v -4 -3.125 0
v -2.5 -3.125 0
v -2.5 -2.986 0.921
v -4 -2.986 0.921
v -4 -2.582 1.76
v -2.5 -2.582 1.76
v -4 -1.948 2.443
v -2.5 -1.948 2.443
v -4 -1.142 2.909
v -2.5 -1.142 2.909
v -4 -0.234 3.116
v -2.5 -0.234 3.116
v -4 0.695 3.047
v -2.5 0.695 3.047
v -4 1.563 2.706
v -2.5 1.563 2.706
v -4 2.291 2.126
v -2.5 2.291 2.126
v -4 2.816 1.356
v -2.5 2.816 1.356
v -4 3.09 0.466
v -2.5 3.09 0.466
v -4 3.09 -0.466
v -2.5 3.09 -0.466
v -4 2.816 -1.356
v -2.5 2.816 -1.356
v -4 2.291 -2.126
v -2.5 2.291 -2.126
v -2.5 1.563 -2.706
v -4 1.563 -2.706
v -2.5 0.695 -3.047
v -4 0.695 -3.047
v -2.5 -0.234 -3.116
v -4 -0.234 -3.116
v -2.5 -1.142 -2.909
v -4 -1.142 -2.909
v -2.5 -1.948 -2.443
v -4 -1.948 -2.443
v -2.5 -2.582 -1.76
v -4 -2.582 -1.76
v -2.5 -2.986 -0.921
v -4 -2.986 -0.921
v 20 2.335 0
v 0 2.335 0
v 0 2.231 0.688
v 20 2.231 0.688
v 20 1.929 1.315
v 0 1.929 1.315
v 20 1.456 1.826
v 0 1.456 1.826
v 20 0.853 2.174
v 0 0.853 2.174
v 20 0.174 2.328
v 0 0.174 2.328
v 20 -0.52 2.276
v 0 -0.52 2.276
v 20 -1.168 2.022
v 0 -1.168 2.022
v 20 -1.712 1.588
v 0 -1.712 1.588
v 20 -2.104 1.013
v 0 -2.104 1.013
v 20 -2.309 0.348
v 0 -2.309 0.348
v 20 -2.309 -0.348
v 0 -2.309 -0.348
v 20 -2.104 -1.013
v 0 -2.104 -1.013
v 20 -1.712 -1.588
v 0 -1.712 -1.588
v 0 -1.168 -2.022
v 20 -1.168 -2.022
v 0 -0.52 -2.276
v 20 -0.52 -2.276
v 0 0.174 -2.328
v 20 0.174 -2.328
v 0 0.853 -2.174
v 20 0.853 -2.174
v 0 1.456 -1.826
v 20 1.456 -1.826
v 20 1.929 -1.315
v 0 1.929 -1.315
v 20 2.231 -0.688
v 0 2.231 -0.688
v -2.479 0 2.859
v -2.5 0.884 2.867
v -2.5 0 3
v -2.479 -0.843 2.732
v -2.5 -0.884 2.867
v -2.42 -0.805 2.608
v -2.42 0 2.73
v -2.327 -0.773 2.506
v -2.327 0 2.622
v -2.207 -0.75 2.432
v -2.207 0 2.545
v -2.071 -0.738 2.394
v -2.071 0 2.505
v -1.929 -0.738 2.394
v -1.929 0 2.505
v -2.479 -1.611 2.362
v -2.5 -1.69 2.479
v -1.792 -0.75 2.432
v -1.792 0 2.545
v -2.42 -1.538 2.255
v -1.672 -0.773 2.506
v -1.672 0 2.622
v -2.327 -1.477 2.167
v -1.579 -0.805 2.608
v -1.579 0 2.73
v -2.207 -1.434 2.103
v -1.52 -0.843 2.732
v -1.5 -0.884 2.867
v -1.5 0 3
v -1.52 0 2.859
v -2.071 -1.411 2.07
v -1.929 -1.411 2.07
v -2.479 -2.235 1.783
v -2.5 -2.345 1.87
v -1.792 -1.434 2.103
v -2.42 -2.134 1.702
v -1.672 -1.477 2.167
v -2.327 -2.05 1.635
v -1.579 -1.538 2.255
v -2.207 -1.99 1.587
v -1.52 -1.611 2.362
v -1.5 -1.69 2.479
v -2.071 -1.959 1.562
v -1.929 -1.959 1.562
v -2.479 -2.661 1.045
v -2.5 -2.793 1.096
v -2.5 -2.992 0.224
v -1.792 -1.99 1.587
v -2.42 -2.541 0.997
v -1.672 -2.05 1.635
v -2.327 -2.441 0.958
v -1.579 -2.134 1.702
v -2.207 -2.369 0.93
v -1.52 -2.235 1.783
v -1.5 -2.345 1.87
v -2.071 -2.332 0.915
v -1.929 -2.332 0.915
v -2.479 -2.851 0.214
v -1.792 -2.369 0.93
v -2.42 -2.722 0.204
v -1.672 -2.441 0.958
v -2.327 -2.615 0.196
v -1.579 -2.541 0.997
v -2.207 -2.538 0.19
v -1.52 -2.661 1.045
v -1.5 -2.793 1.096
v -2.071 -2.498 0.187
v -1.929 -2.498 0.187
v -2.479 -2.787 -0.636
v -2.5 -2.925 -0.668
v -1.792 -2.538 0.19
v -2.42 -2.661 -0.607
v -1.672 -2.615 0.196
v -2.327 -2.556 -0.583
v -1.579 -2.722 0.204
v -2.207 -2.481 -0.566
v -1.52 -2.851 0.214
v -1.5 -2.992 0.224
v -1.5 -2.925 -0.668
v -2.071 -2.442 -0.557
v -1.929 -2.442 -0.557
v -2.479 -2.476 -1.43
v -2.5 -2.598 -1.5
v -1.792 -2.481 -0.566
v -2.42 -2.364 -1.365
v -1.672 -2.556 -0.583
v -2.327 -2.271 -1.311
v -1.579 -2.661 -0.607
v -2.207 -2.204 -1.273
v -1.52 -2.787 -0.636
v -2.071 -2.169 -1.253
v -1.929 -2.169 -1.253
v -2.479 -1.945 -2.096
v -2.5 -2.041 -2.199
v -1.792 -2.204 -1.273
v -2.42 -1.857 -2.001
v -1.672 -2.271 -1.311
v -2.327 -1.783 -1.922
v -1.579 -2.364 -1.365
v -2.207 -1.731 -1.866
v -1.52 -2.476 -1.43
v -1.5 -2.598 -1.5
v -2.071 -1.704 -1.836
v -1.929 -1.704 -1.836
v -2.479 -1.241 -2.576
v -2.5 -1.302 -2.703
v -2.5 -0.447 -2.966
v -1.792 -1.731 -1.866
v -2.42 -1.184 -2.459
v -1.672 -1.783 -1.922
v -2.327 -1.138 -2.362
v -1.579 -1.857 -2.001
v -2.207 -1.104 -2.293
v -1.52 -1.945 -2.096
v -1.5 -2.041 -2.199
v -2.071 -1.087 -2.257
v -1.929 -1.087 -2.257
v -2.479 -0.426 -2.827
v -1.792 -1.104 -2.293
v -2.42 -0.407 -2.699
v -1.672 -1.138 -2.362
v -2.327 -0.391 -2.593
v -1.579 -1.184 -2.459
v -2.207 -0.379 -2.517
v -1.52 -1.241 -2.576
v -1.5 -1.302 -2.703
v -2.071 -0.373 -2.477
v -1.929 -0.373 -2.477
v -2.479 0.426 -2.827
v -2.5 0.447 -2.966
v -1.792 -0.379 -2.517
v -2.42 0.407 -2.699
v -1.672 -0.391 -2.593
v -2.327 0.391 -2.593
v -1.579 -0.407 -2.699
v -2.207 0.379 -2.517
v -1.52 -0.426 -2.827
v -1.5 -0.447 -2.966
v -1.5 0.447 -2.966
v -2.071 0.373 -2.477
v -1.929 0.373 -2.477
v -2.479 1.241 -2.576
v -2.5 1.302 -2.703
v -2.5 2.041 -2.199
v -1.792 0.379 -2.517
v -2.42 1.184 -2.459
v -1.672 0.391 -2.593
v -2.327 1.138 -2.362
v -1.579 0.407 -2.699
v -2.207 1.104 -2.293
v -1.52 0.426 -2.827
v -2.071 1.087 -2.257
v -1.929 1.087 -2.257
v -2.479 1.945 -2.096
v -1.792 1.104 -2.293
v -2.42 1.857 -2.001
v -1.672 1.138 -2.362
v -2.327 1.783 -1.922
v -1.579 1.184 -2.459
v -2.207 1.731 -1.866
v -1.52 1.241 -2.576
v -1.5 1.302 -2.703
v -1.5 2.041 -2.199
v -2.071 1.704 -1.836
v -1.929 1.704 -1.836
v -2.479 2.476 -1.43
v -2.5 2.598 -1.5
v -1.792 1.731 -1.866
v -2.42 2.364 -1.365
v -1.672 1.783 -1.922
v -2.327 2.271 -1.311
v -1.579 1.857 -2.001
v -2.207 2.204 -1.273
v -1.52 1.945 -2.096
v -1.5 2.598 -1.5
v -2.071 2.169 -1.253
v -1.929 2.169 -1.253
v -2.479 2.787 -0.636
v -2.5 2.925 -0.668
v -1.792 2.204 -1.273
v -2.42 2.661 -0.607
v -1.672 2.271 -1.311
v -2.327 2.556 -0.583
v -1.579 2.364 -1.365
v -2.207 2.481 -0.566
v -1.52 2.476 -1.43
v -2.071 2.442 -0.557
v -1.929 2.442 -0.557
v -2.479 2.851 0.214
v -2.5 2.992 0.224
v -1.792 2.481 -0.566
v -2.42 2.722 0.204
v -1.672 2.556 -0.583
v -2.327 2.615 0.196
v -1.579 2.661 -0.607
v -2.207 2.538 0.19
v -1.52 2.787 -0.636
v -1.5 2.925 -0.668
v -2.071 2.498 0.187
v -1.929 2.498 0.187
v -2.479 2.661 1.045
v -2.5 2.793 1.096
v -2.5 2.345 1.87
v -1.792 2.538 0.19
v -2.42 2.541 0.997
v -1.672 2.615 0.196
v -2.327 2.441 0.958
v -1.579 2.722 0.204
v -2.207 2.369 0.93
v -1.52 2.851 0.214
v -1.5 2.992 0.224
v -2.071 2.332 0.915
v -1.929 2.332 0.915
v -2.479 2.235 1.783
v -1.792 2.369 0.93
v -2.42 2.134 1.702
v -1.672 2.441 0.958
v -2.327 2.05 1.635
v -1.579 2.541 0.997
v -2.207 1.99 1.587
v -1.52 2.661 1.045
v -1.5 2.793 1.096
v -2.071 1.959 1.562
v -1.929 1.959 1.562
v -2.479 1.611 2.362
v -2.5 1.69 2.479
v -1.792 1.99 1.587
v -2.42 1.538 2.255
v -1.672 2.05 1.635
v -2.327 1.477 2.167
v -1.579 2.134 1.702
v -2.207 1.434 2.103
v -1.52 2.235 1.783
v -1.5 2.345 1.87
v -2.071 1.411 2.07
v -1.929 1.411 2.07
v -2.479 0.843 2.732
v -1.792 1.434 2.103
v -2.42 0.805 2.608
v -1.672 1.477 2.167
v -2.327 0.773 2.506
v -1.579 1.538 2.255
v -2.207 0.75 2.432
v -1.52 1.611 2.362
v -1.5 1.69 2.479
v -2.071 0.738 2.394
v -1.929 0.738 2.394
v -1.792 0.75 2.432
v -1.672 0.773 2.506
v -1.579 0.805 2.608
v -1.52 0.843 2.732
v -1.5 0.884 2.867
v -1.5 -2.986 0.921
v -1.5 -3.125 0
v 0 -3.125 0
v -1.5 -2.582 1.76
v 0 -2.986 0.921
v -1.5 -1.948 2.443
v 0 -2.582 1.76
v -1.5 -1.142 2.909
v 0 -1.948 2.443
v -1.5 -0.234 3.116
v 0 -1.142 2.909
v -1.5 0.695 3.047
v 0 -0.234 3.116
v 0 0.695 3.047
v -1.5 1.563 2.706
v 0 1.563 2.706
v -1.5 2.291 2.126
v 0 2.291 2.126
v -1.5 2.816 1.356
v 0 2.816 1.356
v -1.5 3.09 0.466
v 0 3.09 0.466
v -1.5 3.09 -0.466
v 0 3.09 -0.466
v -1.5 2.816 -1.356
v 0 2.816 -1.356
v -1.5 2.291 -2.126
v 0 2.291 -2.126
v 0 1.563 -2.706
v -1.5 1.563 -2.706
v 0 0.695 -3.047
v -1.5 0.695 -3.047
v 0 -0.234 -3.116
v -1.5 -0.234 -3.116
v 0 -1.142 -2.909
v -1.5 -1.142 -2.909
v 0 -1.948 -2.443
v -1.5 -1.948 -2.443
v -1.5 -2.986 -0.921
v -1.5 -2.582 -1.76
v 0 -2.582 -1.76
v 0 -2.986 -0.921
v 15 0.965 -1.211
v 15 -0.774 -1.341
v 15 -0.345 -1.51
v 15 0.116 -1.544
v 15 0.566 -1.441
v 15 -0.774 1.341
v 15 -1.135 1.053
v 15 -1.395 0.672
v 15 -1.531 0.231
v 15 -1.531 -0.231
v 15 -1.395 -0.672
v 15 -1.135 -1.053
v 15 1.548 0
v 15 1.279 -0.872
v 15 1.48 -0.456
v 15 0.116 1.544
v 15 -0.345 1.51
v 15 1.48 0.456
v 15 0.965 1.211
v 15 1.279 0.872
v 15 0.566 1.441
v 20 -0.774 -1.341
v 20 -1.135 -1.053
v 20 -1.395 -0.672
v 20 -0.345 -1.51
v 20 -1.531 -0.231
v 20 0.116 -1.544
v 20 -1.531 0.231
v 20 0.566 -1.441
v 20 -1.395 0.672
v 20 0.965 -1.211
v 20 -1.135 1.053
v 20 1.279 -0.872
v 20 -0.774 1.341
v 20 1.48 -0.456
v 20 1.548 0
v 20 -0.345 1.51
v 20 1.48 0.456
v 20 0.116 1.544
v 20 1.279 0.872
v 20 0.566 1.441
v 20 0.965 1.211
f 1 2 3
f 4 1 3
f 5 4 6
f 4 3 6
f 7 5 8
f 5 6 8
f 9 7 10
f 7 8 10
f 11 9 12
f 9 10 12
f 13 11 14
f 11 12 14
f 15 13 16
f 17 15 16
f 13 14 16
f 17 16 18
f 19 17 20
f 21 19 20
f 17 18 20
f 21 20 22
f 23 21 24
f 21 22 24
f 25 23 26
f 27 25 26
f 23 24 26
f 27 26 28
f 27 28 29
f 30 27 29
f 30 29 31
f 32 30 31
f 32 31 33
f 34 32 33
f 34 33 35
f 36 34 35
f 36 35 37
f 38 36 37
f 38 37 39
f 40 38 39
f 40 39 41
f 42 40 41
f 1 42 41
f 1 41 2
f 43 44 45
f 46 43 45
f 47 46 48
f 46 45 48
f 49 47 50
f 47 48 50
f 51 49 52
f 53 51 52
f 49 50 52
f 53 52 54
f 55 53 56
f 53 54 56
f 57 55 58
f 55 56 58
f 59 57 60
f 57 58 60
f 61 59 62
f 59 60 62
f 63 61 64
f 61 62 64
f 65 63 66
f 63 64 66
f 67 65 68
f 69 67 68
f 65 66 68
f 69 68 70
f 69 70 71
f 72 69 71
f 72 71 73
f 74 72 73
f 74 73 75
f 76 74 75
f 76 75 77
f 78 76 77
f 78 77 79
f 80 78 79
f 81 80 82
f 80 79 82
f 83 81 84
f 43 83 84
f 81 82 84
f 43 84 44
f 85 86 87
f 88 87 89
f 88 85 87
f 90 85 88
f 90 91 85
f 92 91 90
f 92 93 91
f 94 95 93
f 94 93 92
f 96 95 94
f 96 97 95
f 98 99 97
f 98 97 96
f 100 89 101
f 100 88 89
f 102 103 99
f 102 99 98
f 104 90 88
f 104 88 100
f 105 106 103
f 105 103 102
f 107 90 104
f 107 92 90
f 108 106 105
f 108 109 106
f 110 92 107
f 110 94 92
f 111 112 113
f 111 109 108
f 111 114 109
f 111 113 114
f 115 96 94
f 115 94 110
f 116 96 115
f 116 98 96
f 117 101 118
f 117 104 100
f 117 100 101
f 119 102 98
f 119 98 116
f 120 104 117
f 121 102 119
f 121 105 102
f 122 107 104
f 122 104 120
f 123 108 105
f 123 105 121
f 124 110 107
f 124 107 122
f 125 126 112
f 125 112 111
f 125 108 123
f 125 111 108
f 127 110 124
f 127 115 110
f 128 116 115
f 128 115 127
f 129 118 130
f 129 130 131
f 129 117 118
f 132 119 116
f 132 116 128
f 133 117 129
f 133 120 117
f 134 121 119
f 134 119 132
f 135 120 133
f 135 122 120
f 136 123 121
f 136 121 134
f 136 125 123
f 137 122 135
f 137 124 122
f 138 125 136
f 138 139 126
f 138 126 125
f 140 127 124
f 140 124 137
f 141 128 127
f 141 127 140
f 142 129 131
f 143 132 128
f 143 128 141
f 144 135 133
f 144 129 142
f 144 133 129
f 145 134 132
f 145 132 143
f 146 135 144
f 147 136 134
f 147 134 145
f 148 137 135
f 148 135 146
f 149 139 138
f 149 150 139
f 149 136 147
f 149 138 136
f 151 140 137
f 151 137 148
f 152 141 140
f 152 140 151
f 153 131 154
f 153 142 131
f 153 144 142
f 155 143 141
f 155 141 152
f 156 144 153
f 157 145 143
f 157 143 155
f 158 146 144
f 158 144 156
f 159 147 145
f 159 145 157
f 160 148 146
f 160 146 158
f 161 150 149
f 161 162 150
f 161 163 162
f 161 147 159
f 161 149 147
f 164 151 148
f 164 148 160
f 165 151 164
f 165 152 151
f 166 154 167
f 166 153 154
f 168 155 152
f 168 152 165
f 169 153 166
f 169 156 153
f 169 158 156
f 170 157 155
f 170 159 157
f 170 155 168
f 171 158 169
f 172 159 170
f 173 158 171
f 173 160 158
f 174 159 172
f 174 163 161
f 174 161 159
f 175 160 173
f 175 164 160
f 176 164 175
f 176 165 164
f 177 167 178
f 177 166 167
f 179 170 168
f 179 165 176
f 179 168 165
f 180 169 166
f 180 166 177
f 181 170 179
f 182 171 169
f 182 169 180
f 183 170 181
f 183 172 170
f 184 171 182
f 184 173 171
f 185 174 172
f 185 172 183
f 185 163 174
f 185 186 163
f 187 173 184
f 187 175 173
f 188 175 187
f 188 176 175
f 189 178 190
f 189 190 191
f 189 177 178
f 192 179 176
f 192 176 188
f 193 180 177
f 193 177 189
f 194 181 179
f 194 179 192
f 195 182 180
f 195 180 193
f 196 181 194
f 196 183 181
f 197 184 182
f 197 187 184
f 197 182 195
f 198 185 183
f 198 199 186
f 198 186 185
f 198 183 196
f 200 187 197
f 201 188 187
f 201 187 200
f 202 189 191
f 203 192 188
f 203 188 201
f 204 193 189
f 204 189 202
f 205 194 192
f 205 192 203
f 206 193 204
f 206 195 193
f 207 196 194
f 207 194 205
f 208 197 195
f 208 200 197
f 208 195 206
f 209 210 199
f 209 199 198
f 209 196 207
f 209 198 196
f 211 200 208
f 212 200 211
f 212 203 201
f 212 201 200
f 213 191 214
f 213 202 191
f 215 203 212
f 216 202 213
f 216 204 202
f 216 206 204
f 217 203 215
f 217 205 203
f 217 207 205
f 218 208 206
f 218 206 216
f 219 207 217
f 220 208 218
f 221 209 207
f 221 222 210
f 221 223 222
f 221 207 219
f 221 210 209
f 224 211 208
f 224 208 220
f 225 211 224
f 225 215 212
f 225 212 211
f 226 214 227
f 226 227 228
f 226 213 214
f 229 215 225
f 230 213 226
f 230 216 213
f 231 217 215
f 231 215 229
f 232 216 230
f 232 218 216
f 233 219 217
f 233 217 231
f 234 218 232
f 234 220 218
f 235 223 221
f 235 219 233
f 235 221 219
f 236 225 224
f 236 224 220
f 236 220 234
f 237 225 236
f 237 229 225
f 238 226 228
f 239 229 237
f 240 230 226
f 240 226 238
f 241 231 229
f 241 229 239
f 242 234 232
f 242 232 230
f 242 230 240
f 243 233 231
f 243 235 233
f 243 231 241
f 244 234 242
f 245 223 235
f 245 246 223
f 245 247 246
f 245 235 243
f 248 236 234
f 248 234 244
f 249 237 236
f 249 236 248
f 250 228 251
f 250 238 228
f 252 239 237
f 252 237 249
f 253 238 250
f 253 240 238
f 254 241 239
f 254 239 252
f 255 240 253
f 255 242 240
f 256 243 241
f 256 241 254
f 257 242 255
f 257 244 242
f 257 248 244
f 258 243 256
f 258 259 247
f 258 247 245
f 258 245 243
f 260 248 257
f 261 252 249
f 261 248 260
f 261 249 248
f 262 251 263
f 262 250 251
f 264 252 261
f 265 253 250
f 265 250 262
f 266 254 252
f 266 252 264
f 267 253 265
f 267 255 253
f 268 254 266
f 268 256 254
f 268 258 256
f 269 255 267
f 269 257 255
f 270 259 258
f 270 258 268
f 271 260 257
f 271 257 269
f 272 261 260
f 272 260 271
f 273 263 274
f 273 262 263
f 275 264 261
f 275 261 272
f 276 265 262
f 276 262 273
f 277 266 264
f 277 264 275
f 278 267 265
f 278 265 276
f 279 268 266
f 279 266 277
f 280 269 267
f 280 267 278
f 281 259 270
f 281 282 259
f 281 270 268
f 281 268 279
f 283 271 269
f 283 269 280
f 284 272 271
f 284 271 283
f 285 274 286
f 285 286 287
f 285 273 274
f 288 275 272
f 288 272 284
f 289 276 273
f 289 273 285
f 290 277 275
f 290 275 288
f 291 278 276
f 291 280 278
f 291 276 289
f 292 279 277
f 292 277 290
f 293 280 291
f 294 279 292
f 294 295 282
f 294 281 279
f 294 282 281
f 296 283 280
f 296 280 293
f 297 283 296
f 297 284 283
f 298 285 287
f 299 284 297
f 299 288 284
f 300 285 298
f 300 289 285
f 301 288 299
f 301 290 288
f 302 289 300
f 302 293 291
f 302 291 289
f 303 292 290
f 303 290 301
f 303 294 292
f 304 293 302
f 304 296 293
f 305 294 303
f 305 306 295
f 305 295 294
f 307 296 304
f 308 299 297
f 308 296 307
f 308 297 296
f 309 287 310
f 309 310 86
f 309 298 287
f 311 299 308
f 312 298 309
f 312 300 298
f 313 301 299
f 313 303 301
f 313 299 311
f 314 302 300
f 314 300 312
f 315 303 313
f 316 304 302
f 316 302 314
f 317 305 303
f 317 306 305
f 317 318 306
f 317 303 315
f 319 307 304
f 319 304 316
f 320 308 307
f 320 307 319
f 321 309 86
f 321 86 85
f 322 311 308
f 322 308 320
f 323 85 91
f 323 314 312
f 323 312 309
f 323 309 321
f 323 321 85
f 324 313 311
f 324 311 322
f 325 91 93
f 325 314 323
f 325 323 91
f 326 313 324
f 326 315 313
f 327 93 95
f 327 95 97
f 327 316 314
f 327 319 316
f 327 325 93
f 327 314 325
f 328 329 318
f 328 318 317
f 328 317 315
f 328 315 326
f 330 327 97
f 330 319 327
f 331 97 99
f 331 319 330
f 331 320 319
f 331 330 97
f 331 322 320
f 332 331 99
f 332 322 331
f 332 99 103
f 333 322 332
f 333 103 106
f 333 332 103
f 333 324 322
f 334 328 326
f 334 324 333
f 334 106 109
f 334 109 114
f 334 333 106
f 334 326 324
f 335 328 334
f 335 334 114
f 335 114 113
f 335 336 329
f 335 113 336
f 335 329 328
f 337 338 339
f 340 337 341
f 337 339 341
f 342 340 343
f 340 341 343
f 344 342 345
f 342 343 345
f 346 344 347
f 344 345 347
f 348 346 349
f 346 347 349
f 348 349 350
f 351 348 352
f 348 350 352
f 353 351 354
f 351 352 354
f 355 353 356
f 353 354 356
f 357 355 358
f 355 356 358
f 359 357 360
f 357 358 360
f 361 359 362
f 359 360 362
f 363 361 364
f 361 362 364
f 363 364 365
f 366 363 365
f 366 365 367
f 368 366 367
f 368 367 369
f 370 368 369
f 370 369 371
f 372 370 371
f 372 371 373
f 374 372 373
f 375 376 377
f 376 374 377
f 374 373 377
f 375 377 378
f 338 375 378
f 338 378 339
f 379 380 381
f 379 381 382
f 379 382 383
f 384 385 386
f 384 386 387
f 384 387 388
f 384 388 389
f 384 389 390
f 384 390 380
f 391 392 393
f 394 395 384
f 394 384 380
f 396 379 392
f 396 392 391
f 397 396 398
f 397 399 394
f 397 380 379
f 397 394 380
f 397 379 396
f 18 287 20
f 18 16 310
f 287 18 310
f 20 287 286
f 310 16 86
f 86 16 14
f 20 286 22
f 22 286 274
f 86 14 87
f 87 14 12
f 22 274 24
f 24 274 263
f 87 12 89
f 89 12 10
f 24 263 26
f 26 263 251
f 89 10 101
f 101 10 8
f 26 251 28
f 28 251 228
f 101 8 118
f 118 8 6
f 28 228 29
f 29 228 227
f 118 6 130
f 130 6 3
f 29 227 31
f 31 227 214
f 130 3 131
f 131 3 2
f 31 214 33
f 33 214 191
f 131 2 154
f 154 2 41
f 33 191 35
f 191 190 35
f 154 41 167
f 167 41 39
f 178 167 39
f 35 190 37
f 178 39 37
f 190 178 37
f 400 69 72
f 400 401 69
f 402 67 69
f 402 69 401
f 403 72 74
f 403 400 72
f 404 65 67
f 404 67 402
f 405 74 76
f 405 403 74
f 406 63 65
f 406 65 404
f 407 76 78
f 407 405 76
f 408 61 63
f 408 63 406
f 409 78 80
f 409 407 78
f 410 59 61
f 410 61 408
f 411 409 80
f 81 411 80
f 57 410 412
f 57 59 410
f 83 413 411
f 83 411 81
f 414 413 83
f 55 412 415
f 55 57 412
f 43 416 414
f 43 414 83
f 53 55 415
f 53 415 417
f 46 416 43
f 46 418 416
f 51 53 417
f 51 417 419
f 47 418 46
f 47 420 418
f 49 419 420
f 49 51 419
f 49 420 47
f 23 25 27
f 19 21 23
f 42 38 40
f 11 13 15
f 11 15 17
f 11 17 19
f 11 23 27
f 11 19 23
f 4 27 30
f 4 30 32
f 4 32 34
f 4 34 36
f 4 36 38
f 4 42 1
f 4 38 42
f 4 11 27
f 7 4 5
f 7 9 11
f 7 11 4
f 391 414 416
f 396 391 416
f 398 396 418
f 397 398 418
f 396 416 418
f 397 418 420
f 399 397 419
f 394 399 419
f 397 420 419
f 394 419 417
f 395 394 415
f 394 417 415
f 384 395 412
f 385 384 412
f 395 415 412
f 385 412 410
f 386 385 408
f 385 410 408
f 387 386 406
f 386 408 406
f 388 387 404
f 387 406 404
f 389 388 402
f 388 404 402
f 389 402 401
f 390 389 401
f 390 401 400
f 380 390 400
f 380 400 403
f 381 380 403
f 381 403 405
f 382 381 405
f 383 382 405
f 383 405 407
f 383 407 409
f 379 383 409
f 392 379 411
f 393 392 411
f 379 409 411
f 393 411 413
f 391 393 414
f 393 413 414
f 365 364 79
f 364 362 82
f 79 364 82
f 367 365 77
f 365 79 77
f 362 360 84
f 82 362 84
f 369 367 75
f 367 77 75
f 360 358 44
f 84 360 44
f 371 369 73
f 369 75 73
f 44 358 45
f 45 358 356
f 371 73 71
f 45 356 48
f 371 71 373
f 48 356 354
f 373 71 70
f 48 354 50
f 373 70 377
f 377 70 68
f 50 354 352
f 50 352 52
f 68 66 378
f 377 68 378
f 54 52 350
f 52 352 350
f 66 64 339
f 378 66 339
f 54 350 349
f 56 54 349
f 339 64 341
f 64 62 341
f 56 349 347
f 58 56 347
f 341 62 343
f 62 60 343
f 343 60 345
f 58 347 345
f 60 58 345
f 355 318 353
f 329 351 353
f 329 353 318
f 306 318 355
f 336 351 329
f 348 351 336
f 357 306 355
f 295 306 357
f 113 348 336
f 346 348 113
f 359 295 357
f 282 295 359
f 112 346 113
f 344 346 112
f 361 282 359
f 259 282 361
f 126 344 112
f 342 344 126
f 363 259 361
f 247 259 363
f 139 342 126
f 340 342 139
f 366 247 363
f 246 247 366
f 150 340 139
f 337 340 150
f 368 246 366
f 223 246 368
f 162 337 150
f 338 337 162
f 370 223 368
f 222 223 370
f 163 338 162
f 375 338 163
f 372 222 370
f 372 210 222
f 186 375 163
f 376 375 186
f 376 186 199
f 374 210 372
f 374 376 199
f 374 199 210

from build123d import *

# Parameters (mm, degrees)
F0_R     = 2.335
F1_DEPTH = 20
F2_R     = 3.125
F3_DEPTH = 4
F4_W     = 1
F4_H     = 1.443127
F6_R     = 1.54834
F7_DEPTH = 5


with BuildPart() as f1:
    # F0 (on Right) → F1 (new body)
    with BuildSketch(Plane.YZ):
        Circle(F0_R)
    extrude(amount=F1_DEPTH)

    # F2 (on face) → F3 (join)
    with BuildSketch(Plane(origin=(0, 0, 0), x_dir=(0, -1, 0), z_dir=(-1, 0, 0))):
        Circle(F2_R)
    extrude(amount=F3_DEPTH)

    # F4 (on Front) → F5 (revolve, cut)
    with BuildSketch(Plane.XZ):
        with BuildLine():
            Line((-1.499683, 3), (-2.499683, 3))
            ThreePointArc((-2.499683, 3), (-1.999683, 2.5), (-1.499683, 3))
        make_face()
        with Locations((-1.999683, 3.721563)):
            Rectangle(F4_W, F4_H)
    revolve(axis=Axis((-1.744851, 0, 0), (1, 0, 0)), mode=Mode.SUBTRACT)

    # F6 (on face) → F7 (cut)
    with BuildSketch(Plane.YZ.offset(20)):
        Circle(F6_R)
    extrude(amount=-F7_DEPTH, mode=Mode.SUBTRACT)


solid = f1.part
